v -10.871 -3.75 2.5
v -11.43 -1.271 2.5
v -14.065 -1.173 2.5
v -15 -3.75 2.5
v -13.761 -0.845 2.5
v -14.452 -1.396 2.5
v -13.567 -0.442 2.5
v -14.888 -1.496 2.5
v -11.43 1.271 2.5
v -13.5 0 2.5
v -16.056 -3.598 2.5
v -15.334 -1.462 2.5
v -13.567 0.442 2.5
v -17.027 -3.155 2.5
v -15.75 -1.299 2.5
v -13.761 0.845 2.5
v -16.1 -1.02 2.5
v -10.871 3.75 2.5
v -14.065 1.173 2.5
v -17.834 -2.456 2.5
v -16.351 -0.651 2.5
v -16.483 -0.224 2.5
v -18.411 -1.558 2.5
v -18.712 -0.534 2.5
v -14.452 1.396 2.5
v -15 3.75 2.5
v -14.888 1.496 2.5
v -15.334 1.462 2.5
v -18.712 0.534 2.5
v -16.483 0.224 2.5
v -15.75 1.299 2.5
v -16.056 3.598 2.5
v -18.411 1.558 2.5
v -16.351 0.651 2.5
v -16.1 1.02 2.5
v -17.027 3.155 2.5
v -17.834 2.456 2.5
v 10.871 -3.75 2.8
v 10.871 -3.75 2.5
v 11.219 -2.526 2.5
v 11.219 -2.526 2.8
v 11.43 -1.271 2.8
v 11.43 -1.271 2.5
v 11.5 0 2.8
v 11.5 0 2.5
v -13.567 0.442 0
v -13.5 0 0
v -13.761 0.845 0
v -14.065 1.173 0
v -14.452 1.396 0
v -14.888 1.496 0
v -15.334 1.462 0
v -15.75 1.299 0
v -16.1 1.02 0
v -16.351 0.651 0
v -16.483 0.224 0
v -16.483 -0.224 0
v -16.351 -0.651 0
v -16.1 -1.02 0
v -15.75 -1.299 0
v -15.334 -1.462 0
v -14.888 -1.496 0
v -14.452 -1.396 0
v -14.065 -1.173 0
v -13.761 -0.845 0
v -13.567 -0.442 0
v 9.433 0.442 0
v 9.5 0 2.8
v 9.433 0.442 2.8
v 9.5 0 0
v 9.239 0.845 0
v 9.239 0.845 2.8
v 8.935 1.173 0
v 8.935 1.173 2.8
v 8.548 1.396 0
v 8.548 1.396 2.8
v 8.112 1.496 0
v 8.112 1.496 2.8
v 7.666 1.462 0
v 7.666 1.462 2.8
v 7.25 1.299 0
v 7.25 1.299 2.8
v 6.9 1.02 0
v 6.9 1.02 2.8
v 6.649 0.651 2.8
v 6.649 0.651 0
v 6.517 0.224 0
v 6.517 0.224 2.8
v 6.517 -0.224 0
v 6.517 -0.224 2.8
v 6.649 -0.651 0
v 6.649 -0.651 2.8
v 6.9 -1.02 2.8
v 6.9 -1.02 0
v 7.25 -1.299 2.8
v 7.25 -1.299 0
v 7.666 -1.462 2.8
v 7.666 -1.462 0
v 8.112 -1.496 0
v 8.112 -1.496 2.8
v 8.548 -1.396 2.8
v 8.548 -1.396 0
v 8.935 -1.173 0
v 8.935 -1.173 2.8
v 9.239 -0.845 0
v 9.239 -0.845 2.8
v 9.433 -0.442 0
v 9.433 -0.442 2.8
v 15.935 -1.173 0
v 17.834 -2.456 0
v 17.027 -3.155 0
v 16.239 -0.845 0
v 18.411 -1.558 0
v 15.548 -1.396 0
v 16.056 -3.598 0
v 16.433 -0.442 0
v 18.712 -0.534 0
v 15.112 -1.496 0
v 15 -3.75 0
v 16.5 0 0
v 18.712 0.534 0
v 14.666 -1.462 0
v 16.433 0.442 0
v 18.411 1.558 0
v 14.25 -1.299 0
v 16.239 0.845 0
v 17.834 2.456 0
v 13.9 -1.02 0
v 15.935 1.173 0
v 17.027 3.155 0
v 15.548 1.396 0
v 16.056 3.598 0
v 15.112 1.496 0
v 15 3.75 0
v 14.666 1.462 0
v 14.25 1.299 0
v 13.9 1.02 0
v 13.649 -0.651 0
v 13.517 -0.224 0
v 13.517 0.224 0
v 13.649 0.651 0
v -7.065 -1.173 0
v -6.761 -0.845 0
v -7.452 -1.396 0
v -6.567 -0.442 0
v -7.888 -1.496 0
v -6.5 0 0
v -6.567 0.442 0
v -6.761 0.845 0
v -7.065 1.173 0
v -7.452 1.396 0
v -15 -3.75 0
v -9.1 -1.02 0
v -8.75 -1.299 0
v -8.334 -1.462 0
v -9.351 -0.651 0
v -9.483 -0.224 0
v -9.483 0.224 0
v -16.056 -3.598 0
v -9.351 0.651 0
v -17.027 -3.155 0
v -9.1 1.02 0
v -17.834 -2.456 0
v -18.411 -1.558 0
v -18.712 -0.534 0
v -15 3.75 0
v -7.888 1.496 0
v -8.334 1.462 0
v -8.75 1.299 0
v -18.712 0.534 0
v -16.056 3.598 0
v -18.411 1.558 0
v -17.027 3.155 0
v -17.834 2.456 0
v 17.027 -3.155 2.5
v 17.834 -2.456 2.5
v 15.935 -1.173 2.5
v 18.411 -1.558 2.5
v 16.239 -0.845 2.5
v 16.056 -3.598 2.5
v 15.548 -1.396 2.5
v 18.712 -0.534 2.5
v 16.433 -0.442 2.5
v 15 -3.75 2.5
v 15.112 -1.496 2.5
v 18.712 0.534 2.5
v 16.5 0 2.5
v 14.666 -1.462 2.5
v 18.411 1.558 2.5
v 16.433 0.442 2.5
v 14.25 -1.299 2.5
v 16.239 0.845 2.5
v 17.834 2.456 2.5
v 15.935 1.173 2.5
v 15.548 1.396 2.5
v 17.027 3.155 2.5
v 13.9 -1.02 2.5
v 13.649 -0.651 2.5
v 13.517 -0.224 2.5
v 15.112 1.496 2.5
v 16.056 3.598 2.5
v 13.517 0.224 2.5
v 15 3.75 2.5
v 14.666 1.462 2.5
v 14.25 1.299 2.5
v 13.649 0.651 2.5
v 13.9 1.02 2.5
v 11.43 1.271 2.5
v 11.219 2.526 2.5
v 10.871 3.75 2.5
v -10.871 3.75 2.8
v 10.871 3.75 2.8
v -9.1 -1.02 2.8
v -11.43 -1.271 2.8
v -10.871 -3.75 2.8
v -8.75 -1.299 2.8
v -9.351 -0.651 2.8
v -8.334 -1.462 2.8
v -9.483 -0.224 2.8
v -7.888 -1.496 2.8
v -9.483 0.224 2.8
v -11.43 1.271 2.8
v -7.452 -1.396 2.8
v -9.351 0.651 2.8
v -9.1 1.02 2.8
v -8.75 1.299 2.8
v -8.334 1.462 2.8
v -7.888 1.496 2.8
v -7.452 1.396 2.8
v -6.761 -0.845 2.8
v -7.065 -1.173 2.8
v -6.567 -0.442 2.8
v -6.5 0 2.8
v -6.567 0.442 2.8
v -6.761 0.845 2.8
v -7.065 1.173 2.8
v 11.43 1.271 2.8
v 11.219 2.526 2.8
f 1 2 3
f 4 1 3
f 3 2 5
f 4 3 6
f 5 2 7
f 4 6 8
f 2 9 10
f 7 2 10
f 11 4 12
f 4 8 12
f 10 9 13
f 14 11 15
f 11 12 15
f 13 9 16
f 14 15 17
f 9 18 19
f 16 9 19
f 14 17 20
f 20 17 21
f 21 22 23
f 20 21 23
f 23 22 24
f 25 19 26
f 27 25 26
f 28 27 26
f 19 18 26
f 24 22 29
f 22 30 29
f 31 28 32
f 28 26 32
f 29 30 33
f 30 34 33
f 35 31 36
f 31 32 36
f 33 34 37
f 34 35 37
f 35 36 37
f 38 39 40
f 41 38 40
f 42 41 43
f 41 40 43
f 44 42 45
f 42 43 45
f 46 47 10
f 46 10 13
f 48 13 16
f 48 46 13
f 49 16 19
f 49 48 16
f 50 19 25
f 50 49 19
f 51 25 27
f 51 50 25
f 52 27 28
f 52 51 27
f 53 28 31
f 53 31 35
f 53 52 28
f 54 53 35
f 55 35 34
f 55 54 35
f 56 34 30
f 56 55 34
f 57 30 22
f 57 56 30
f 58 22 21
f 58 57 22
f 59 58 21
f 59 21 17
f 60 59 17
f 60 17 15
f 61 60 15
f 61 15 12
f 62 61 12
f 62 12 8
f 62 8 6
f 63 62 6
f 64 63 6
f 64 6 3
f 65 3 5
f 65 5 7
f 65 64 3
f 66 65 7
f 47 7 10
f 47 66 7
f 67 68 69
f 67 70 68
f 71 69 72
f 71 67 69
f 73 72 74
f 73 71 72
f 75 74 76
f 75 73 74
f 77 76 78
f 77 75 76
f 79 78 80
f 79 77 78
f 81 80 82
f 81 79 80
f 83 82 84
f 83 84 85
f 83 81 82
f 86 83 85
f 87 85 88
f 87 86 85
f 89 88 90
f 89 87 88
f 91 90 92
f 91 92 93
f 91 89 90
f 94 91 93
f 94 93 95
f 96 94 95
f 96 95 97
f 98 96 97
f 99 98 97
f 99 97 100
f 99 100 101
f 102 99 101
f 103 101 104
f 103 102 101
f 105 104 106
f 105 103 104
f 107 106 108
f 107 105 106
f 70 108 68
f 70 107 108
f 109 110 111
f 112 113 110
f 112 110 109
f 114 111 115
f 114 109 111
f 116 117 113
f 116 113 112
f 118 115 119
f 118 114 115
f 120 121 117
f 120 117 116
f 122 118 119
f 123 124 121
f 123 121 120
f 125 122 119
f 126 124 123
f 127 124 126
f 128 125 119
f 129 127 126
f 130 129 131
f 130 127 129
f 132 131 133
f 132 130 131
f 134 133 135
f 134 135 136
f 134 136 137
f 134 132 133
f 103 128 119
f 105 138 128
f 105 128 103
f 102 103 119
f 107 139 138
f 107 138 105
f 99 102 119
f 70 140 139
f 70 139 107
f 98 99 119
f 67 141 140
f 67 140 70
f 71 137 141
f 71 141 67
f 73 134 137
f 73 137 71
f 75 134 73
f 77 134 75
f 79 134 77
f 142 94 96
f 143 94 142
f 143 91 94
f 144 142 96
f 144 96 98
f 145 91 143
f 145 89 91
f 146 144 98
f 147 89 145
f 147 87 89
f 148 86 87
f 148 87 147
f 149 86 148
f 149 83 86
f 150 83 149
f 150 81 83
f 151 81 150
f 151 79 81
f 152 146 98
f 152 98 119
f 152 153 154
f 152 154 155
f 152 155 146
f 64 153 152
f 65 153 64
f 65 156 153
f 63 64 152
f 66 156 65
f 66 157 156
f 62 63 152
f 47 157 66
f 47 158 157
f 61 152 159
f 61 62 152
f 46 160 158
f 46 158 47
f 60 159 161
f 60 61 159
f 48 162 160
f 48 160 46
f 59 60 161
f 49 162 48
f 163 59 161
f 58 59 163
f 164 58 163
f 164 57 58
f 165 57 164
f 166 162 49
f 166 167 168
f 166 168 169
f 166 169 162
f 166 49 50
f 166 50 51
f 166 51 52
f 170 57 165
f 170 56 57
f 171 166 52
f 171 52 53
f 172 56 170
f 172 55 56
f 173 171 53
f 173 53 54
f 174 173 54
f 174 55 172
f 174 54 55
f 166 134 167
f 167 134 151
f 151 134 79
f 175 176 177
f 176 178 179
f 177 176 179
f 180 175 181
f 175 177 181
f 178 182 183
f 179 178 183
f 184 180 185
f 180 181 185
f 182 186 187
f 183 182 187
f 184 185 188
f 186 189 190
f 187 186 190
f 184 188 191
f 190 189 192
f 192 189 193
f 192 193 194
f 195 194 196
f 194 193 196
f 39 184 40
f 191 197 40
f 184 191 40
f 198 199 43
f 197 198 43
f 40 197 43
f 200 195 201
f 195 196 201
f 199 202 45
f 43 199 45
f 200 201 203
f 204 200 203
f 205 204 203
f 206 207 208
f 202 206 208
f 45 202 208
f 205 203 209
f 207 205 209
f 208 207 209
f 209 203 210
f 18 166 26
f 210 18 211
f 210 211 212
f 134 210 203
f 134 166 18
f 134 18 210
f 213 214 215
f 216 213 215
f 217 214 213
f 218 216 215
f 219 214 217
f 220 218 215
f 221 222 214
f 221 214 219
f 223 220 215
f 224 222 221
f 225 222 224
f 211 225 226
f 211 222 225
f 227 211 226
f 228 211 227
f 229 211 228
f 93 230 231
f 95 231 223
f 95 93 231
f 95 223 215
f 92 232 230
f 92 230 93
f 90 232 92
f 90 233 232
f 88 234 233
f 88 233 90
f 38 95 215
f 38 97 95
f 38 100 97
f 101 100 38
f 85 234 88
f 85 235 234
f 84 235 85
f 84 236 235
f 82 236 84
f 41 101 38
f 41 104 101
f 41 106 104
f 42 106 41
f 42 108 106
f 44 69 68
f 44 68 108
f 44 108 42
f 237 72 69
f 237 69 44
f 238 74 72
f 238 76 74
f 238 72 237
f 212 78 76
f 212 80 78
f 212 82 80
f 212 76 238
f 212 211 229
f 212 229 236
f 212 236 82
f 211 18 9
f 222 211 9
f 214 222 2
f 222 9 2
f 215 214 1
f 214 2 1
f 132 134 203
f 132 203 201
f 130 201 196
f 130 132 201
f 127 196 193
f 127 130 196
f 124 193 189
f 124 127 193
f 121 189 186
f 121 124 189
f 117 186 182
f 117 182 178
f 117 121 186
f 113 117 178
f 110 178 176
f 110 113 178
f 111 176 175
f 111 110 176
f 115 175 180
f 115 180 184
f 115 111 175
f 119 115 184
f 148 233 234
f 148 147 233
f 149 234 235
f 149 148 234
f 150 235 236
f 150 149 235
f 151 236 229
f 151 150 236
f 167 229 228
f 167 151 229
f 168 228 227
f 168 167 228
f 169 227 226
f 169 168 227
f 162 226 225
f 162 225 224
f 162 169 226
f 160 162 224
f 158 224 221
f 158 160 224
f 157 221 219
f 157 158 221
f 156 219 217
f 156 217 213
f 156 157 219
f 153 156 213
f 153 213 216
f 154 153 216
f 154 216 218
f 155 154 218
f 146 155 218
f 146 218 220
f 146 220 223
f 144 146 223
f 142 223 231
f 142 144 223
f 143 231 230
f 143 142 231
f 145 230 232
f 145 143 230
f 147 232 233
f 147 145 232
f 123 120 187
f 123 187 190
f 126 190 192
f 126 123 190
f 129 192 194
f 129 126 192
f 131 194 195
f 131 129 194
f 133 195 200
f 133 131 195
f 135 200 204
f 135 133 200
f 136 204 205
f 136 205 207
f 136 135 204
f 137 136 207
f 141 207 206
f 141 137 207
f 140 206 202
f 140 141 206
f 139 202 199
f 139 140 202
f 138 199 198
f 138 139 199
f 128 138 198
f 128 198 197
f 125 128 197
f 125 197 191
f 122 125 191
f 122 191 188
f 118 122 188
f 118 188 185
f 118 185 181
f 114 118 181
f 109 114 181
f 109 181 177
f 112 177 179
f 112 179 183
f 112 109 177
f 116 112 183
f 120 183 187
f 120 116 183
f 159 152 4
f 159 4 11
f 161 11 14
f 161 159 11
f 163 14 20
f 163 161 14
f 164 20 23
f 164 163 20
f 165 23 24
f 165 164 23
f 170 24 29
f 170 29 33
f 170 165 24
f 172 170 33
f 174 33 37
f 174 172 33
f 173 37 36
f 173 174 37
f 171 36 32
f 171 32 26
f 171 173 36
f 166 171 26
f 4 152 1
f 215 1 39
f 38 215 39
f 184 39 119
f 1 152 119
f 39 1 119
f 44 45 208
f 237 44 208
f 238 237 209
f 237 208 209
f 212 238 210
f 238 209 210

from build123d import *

# Parameters (mm, degrees)
SKIZZE1_R       = 1.5
BASE_DEPTH      = 2.5
SKIZZE3_W       = 21.742814906
SKIZZE3_H       = 7.5
SKIZZE3_R       = 1.5
DISTANCER_DEPTH = 0.3


with BuildPart() as part:
    # Skizze1 → Base (new body)
    with BuildSketch(Plane.XY):
        with BuildLine():
            Line((-15, 3.75), (15, 3.75))
            ThreePointArc((15, 3.75), (18.75, 0), (15, -3.75))
            Line((15, -3.75), (-15, -3.75))
            ThreePointArc((-15, -3.75), (-18.75, 0), (-15, 3.75))
        make_face()
        with Locations((-15, 0)):
            Circle(SKIZZE1_R, mode=Mode.SUBTRACT)
        with Locations((15, 0)):
            Circle(SKIZZE1_R, mode=Mode.SUBTRACT)
        with Locations((-8, 0)):
            Circle(SKIZZE1_R, mode=Mode.SUBTRACT)
        with Locations((8, 0)):
            Circle(SKIZZE1_R, mode=Mode.SUBTRACT)
    extrude(amount=BASE_DEPTH)

    # Skizze3 → Distancer (add)
    # profile 1 of 3: a face of its own
    with BuildSketch(Plane.XY.offset(2.5)):
        with BuildLine():
            ThreePointArc((-10.871407453, 3.75), (-11.5, 0), (-10.871407453, -3.75))
            Line((-10.871407453, -3.75), (-10.871407453, 3.75))
        make_face()
    # profile 2 of 3: a face of its own
    with BuildSketch(Plane.XY.offset(2.5)):
        with BuildLine():
            Line((10.871407453, 3.75), (10.871407453, -3.75))
            ThreePointArc((10.871407453, -3.75), (11.341763216, -1.901159422), (11.5, 0))
            ThreePointArc((11.5, 0), (11.341763216, 1.901159422), (10.871407453, 3.75))
        make_face()
    # profile 3 of 3: a face of its own
    with BuildSketch(Plane.XY.offset(2.5)):
        Rectangle(SKIZZE3_W, SKIZZE3_H)
        with Locations((-8, 0)):
            Circle(SKIZZE3_R, mode=Mode.SUBTRACT)
        with Locations((8, 0)):
            Circle(SKIZZE3_R, mode=Mode.SUBTRACT)
    extrude(amount=DISTANCER_DEPTH)


solid = part.part
